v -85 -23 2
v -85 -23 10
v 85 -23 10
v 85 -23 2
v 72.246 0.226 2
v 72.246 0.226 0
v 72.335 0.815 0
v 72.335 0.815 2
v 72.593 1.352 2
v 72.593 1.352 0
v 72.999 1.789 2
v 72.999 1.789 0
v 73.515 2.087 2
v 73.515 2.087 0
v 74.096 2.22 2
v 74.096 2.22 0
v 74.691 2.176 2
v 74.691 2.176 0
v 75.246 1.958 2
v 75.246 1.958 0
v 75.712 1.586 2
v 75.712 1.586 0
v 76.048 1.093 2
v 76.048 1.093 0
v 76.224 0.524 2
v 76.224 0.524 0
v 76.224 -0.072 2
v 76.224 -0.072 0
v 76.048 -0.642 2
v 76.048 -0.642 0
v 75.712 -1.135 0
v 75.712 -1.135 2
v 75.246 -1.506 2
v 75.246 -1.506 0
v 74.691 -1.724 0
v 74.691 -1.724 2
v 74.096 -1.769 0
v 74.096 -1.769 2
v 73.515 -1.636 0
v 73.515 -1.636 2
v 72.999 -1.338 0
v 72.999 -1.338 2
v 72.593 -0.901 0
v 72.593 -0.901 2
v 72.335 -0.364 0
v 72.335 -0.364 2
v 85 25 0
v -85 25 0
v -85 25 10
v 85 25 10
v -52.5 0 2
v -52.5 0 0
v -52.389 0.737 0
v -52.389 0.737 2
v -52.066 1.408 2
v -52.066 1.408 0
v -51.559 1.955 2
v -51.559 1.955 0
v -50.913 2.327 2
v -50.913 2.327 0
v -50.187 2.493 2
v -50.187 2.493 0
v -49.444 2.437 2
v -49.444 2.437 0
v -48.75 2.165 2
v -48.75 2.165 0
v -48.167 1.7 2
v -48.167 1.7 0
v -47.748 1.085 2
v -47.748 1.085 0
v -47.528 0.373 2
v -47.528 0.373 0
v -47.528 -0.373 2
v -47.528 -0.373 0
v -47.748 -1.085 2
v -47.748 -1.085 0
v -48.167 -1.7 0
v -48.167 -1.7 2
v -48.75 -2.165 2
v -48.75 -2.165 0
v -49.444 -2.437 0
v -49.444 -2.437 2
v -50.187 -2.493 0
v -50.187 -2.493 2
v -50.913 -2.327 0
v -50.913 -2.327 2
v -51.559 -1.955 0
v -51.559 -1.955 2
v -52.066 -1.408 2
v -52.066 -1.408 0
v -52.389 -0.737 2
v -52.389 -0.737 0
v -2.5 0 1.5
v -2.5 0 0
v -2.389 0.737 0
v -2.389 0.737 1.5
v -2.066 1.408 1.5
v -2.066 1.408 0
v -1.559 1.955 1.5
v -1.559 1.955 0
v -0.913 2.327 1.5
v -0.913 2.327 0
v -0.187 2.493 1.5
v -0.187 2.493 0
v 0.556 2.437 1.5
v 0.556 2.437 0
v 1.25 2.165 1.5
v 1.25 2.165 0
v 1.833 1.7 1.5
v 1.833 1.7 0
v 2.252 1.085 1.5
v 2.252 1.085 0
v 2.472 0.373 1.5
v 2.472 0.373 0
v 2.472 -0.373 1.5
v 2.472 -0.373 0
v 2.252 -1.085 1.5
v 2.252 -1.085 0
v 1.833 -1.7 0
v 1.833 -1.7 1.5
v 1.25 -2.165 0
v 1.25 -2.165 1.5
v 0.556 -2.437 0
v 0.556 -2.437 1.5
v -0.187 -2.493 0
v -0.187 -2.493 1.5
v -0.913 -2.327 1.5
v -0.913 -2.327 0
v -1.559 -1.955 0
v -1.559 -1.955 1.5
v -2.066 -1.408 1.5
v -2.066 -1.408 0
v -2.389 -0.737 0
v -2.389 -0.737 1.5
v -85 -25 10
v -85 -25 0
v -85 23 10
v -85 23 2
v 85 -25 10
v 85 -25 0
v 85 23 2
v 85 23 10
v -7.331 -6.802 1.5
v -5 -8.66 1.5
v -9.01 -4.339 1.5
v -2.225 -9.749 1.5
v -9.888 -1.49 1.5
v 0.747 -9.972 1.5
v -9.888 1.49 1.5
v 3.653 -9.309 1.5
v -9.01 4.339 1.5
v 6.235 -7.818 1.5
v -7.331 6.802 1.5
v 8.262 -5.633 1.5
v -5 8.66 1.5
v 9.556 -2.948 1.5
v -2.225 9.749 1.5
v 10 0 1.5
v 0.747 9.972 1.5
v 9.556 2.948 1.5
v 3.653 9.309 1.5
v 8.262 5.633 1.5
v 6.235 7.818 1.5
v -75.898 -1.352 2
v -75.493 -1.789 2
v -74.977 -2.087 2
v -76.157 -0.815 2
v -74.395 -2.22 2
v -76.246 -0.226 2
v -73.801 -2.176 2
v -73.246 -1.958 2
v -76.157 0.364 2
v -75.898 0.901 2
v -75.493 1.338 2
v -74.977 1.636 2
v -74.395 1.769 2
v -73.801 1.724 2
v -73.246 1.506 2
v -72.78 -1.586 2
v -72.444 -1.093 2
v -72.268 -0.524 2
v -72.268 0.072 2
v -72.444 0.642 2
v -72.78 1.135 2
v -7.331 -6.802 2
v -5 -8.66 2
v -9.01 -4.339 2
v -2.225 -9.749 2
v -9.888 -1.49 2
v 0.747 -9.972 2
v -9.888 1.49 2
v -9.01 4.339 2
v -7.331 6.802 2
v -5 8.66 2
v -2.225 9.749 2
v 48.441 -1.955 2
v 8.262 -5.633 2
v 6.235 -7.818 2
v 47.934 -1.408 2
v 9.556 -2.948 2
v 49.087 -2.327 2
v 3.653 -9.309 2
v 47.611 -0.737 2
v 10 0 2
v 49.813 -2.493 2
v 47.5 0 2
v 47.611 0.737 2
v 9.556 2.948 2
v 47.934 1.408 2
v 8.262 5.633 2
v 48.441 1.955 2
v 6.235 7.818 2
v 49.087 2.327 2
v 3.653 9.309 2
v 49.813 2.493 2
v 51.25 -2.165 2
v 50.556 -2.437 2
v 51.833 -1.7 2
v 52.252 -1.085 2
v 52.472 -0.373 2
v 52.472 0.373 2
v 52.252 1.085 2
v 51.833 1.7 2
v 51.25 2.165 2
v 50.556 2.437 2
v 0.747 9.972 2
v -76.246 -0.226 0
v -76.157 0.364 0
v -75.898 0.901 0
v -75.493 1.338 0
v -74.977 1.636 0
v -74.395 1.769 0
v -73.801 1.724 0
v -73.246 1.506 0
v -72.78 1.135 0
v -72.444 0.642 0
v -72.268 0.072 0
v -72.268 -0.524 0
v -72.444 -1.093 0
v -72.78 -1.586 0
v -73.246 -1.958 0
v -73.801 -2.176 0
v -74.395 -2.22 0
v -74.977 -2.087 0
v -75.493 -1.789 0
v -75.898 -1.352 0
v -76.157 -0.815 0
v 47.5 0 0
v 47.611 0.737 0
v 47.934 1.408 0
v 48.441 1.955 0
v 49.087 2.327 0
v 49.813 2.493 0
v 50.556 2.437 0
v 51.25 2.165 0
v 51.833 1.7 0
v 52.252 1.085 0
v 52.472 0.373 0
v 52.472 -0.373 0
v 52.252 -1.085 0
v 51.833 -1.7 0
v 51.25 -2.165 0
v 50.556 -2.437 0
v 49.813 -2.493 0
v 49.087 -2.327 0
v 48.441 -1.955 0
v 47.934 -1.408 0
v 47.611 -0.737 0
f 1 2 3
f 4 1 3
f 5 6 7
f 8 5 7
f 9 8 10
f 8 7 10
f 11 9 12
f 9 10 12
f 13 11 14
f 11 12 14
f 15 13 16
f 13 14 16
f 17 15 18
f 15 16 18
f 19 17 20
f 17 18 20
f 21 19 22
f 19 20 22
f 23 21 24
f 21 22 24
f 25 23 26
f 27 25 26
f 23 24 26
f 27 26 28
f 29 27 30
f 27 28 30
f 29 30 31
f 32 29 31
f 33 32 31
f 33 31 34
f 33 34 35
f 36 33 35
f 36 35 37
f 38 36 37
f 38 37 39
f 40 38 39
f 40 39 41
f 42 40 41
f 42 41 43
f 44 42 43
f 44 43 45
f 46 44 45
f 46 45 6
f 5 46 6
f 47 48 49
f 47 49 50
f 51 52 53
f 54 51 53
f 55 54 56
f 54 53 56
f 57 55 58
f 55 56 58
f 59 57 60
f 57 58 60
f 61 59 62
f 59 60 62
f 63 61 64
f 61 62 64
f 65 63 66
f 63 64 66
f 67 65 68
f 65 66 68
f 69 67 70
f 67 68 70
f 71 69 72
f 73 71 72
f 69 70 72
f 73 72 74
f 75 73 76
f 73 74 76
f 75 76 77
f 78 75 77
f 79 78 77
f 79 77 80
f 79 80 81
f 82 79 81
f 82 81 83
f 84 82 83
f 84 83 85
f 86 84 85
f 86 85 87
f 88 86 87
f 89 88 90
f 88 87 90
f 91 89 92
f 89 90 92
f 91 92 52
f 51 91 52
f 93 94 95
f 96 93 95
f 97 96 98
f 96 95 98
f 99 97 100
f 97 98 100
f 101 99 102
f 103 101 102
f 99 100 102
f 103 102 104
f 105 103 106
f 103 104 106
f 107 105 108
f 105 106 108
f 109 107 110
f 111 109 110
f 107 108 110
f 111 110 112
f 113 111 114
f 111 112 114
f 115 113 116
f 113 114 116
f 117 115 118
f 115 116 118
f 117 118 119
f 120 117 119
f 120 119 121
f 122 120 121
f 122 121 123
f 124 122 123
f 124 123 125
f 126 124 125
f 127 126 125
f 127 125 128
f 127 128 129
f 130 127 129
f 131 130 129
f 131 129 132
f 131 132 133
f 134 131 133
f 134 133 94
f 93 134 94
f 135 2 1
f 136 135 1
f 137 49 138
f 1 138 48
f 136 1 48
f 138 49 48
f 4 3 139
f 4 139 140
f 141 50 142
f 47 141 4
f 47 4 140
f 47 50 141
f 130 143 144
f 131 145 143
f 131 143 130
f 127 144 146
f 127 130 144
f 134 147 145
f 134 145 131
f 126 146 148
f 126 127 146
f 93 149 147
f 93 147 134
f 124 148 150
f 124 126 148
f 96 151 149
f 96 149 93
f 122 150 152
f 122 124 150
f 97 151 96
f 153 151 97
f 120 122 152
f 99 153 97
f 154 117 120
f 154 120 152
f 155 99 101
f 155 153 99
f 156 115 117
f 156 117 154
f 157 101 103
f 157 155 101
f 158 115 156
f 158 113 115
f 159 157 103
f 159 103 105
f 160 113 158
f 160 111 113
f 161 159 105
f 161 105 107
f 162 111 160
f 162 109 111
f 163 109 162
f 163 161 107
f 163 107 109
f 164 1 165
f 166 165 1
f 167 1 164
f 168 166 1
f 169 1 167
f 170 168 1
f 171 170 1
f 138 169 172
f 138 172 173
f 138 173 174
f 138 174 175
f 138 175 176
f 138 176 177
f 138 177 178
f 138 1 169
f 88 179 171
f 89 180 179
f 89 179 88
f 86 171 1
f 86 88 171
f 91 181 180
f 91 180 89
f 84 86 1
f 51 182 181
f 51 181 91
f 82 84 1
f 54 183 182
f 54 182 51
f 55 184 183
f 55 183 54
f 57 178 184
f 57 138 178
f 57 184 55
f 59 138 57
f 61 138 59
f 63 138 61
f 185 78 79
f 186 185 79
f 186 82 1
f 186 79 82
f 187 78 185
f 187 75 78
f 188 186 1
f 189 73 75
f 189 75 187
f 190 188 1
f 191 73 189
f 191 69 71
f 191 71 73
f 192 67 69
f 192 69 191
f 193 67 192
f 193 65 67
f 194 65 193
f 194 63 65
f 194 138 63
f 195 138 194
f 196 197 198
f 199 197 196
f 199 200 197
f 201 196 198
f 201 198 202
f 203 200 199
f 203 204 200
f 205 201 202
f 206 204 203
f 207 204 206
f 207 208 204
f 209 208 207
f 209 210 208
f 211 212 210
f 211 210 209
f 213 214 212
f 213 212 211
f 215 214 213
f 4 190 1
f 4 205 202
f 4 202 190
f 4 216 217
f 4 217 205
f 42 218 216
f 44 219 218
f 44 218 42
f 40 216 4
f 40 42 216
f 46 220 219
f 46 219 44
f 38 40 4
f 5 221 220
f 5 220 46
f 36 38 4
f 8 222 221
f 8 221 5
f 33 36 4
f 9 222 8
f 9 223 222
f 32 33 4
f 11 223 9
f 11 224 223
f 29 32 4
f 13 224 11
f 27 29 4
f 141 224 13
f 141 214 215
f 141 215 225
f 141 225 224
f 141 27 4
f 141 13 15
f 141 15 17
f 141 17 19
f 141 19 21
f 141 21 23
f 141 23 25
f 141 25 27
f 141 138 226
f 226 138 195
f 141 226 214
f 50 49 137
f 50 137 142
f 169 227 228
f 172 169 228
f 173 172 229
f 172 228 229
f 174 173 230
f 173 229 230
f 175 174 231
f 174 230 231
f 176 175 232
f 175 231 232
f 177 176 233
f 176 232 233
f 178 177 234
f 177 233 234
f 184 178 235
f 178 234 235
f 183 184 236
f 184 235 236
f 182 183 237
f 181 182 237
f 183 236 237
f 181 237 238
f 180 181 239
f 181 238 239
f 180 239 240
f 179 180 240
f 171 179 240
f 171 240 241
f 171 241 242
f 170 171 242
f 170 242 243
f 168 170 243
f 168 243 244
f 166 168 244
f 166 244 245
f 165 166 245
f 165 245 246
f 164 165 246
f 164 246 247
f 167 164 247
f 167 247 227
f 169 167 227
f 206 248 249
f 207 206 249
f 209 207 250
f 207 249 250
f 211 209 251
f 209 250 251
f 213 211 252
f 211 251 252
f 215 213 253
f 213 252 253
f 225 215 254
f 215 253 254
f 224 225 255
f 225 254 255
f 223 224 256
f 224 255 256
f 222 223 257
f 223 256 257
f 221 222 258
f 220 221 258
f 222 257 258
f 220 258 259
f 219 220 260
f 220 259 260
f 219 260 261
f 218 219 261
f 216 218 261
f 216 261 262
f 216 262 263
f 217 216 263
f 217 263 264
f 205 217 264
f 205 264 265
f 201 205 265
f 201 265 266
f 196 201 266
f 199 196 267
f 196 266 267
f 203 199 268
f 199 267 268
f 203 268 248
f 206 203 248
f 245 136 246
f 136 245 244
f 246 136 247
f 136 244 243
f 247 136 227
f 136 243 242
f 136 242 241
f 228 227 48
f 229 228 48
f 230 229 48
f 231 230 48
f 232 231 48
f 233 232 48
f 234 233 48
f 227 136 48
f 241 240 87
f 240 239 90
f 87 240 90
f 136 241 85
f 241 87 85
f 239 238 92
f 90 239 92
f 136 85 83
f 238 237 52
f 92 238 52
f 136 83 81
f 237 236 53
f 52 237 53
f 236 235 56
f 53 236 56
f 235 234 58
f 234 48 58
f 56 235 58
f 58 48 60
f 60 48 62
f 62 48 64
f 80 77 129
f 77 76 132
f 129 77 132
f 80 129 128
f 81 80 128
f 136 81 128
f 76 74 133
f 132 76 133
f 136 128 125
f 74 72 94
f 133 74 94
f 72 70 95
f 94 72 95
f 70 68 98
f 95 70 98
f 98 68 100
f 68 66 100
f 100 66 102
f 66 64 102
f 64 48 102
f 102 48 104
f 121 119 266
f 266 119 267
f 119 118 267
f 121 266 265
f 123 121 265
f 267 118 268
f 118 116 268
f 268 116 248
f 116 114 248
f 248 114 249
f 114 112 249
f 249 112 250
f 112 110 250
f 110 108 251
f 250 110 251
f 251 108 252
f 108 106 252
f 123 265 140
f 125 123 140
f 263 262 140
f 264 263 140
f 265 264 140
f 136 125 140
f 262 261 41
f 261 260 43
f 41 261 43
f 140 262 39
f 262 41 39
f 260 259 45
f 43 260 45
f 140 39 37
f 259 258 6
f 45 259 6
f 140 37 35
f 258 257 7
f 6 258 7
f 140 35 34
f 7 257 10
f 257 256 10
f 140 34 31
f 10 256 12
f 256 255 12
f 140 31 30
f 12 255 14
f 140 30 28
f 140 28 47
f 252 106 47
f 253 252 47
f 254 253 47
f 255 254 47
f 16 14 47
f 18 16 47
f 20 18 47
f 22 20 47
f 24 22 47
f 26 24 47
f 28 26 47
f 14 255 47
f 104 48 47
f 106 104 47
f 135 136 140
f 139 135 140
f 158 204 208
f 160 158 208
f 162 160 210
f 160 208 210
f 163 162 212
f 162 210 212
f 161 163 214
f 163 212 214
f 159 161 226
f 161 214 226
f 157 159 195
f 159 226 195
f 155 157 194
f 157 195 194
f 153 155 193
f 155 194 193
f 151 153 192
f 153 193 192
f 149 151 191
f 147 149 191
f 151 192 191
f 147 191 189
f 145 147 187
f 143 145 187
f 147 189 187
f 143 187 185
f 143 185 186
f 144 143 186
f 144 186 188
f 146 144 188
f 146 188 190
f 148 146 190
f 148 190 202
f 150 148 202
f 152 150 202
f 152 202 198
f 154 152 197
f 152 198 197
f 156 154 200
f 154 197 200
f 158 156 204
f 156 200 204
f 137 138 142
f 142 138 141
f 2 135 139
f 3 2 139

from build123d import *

# Parameters (mm, degrees)
SKETCH1_W           = 170
SKETCH1_H           = 50
BOSS_EXTRUDE1_DEPTH = 2
SKETCH2_W           = 170
SKETCH2_H           = 10
BOSS_EXTRUDE2_DEPTH = 2
SKETCH3_W           = 170
SKETCH3_H           = 10
BOSS_EXTRUDE3_DEPTH = 2
SKETCH4_R           = 2.5
CUT_EXTRUDE1_DEPTH  = 2
SKETCH5_R           = 10
CUT_EXTRUDE2_DEPTH  = 0.5
SKETCH7_R           = 2
CUT_EXTRUDE4_DEPTH  = 30


with BuildPart() as part:
    # Sketch1 → Boss-Extrude1 (new body)
    with BuildSketch(Plane.XY):
        Rectangle(SKETCH1_W, SKETCH1_H)
    extrude(amount=BOSS_EXTRUDE1_DEPTH)

    # Sketch2 → Boss-Extrude2 (add)
    with BuildSketch(Plane(origin=(0, 25, 0), x_dir=(1, 0, 0), z_dir=(0, 1, 0))):
        with Locations((0, -5)):
            Rectangle(SKETCH2_W, SKETCH2_H)
    extrude(amount=-BOSS_EXTRUDE2_DEPTH)

    # Sketch3 → Boss-Extrude3 (add)
    with BuildSketch(Plane.XZ.offset(25)):
        with Locations((0, 5)):
            Rectangle(SKETCH3_W, SKETCH3_H)
    extrude(amount=-BOSS_EXTRUDE3_DEPTH)

    # Sketch4 → Cut-Extrude1 (cut)
    with BuildSketch(Plane(origin=(0, 0, 0), x_dir=(-1, 0, 0), z_dir=(0, 0, -1))):
        Circle(SKETCH4_R)
        with Locations((-50, 0)):
            Circle(SKETCH4_R)
        with Locations((50, 0)):
            Circle(SKETCH4_R)
    extrude(amount=-CUT_EXTRUDE1_DEPTH, mode=Mode.SUBTRACT)

    # Sketch5 → Cut-Extrude2 (cut)
    with BuildSketch(Plane.XY.offset(2)):
        Circle(SKETCH5_R)
    extrude(amount=-CUT_EXTRUDE2_DEPTH, mode=Mode.SUBTRACT)

    # Sketch7 → Cut-Extrude4 (cut)
    with BuildSketch(Plane(origin=(0, 0, 0), x_dir=(-1, 0, 0), z_dir=(0, 0, -1))):
        with Locations((-74.245869062, 0.225670703)):
            Circle(SKETCH7_R)
        with Locations((74.245869062, -0.225670703)):
            Circle(SKETCH7_R)
    extrude(amount=-CUT_EXTRUDE4_DEPTH, mode=Mode.SUBTRACT)


solid = part.part
